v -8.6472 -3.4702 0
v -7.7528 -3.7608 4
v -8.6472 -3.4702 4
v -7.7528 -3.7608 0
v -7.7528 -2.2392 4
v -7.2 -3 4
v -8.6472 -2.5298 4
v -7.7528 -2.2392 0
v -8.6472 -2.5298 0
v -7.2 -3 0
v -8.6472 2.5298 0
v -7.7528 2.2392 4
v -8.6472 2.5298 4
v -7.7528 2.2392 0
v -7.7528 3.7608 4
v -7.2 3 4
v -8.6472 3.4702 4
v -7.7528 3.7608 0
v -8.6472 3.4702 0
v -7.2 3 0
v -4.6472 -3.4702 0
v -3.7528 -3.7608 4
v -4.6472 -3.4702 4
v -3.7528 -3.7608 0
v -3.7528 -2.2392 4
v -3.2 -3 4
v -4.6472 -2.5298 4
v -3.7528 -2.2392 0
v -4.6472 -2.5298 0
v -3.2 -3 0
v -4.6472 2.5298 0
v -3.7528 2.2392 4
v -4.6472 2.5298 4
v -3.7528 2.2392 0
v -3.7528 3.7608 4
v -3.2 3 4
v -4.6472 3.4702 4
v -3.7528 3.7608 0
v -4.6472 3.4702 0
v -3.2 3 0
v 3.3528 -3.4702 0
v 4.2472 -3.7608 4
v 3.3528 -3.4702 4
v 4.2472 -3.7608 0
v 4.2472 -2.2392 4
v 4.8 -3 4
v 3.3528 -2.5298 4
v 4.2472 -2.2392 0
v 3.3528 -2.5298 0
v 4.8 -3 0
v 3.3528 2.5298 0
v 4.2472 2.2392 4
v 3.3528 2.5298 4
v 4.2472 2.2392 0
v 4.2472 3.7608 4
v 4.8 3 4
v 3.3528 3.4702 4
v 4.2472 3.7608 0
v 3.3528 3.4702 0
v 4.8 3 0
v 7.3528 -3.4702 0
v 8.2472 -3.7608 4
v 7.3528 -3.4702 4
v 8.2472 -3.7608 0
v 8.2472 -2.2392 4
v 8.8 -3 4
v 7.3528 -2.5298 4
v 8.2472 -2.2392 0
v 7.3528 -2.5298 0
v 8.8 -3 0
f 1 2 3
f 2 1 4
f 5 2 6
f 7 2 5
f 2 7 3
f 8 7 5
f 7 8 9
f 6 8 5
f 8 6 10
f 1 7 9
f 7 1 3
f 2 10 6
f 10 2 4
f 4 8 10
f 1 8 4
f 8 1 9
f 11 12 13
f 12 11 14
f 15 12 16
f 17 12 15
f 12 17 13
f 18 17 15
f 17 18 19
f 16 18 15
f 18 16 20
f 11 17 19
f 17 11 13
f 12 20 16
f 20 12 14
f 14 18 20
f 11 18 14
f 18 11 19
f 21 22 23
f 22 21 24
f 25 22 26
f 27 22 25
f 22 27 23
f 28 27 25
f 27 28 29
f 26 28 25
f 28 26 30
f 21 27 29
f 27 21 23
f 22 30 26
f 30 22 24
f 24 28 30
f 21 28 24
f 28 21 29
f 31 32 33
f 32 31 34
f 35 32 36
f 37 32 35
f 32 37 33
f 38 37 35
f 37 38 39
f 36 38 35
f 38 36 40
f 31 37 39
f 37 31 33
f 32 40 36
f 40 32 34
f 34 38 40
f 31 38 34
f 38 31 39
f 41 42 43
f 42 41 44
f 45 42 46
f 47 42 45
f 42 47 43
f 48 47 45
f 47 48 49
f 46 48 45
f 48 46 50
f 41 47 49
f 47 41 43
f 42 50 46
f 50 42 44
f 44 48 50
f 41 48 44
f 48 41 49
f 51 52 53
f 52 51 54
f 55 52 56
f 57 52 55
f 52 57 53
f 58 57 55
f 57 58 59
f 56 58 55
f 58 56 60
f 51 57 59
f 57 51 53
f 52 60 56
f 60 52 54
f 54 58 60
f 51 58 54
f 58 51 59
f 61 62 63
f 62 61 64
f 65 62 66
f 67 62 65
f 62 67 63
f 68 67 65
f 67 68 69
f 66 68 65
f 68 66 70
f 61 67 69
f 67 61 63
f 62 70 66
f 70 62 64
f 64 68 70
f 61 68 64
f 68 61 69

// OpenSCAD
union() {
	translate([-8, -3, 0]) cylinder(r=0.8, h=4);
	translate([-8, 3, 0]) cylinder(r=0.8, h=4);
	translate([-4, -3, 0]) cylinder(r=0.8, h=4);
	translate([-4, 3, 0]) cylinder(r=0.8, h=4);
	translate([4, -3, 0]) cylinder(r=0.8, h=4);
	translate([4, 3, 0]) cylinder(r=0.8, h=4);
	translate([8, -3, 0]) cylinder(r=0.8, h=4);
}
